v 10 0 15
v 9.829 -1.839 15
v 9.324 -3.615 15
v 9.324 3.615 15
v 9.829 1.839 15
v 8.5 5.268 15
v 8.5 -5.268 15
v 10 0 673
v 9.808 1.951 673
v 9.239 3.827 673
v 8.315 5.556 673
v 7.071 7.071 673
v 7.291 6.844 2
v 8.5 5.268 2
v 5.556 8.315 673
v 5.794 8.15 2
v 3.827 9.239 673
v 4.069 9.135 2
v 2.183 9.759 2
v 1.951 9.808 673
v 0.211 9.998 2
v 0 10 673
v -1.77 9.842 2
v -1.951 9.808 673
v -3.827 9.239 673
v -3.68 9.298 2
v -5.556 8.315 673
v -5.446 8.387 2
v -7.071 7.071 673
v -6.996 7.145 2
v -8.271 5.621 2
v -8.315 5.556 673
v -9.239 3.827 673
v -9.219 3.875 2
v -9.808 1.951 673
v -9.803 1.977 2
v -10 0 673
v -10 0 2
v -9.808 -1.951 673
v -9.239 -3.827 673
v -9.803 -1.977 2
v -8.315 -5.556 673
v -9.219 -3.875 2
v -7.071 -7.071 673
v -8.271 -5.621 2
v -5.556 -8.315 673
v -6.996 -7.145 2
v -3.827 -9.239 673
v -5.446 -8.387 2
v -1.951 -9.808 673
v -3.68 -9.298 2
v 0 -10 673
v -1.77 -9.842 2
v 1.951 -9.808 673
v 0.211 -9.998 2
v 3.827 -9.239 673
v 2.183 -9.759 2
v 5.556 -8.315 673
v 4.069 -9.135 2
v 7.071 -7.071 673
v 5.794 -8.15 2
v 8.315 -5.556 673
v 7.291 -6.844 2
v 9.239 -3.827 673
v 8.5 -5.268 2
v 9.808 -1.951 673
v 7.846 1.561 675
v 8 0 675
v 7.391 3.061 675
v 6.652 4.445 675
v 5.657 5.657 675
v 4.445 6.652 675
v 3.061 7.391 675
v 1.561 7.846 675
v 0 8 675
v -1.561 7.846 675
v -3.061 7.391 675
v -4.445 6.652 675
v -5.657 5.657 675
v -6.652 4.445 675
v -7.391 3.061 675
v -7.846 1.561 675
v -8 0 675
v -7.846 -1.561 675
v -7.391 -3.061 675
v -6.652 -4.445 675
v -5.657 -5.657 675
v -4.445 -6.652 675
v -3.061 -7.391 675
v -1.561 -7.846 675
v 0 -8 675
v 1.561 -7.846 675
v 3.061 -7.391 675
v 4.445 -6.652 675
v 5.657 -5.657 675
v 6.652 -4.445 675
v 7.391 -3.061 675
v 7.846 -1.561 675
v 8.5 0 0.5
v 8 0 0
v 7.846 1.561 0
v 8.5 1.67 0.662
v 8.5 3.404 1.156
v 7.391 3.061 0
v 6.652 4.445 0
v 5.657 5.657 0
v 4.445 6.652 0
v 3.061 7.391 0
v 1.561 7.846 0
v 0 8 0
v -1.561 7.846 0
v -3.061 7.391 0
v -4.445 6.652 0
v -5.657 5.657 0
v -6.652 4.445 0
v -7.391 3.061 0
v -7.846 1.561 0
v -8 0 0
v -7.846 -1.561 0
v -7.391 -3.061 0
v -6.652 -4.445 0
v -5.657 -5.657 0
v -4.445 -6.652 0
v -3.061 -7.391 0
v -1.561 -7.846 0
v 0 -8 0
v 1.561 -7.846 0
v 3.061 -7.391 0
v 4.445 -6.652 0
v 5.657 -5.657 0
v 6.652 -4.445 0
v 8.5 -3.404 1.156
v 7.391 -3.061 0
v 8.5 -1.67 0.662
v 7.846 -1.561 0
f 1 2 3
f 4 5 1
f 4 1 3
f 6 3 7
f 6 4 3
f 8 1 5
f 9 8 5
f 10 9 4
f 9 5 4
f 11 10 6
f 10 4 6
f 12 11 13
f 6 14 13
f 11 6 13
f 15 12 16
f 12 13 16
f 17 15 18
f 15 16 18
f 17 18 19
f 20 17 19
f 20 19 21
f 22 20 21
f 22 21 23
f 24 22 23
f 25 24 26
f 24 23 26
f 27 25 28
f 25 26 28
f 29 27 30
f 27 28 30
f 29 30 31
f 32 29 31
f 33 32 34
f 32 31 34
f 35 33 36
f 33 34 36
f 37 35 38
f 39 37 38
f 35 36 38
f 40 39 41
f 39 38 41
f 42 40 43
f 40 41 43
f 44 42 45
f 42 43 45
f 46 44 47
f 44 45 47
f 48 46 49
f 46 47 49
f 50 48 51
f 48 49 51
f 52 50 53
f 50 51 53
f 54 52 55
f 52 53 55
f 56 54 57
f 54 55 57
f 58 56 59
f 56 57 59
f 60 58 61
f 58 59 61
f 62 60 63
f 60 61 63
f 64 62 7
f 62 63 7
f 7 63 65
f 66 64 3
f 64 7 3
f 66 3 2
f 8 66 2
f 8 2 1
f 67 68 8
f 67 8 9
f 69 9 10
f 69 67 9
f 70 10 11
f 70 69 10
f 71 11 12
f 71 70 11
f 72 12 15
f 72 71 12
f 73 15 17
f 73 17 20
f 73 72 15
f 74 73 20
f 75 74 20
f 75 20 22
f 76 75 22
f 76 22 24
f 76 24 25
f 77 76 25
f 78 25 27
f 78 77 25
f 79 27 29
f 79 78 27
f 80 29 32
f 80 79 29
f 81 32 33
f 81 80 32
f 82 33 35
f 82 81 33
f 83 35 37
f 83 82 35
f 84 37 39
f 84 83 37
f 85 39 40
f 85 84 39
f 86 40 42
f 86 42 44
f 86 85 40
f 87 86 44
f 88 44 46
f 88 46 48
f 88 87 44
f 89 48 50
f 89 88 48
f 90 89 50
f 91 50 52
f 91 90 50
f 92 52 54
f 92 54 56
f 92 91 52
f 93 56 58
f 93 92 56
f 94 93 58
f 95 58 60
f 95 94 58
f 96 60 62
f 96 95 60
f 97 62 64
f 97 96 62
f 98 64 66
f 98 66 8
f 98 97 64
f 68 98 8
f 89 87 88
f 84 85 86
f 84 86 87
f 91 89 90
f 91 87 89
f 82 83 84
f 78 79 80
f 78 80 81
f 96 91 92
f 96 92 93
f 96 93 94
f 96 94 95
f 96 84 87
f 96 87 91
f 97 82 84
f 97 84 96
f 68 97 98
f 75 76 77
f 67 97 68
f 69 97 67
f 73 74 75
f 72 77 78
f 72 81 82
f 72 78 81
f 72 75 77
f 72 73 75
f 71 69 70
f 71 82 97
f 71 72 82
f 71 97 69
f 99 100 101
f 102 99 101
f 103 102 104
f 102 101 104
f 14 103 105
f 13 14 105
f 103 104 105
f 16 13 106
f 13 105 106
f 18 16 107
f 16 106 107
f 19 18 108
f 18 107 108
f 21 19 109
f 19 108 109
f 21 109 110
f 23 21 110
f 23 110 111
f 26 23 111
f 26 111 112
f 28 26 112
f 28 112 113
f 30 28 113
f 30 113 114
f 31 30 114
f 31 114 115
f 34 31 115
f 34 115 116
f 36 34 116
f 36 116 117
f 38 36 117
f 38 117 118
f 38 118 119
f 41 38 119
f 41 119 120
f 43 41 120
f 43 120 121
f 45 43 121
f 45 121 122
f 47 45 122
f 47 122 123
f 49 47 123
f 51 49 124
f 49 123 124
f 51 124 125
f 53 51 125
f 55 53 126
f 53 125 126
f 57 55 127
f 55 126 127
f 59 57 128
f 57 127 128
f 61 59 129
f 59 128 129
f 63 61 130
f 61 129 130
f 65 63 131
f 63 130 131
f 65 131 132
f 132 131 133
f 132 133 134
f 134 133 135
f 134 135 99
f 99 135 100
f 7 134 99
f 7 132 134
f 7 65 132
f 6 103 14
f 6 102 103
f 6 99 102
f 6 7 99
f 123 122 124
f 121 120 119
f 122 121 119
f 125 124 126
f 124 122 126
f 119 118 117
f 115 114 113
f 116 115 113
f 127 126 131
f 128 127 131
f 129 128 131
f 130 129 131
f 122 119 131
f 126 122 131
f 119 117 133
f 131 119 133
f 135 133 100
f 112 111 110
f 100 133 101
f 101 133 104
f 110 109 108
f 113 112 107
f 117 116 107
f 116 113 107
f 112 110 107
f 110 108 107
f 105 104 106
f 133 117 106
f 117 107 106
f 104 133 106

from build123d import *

# Parameters (mm, degrees)
F0_R     = 10
F1_DEPTH = 675
F2_SIZE  = 2
F4_W     = 21
F4_H     = 15
F5_DEPTH = 1.5


with BuildPart() as f1:
    # F0 (on Top) → F1 (new body)
    with BuildSketch(Plane.XY):
        Circle(F0_R)
    extrude(amount=F1_DEPTH)

    # F2
    f2_edges = [f1.edges().sort_by_distance(p)[0] for p in [
        (-10, 0, 0),
        (-10, 0, 675),
    ]]
    chamfer(f2_edges, length=F2_SIZE)

    # F4 (on offset) → F5 (cut)
    with BuildSketch(Plane.YZ.offset(10)):
        with Locations((0, 7.5)):
            Rectangle(F4_W, F4_H)
    extrude(amount=-F5_DEPTH, mode=Mode.SUBTRACT)


solid = f1.part
